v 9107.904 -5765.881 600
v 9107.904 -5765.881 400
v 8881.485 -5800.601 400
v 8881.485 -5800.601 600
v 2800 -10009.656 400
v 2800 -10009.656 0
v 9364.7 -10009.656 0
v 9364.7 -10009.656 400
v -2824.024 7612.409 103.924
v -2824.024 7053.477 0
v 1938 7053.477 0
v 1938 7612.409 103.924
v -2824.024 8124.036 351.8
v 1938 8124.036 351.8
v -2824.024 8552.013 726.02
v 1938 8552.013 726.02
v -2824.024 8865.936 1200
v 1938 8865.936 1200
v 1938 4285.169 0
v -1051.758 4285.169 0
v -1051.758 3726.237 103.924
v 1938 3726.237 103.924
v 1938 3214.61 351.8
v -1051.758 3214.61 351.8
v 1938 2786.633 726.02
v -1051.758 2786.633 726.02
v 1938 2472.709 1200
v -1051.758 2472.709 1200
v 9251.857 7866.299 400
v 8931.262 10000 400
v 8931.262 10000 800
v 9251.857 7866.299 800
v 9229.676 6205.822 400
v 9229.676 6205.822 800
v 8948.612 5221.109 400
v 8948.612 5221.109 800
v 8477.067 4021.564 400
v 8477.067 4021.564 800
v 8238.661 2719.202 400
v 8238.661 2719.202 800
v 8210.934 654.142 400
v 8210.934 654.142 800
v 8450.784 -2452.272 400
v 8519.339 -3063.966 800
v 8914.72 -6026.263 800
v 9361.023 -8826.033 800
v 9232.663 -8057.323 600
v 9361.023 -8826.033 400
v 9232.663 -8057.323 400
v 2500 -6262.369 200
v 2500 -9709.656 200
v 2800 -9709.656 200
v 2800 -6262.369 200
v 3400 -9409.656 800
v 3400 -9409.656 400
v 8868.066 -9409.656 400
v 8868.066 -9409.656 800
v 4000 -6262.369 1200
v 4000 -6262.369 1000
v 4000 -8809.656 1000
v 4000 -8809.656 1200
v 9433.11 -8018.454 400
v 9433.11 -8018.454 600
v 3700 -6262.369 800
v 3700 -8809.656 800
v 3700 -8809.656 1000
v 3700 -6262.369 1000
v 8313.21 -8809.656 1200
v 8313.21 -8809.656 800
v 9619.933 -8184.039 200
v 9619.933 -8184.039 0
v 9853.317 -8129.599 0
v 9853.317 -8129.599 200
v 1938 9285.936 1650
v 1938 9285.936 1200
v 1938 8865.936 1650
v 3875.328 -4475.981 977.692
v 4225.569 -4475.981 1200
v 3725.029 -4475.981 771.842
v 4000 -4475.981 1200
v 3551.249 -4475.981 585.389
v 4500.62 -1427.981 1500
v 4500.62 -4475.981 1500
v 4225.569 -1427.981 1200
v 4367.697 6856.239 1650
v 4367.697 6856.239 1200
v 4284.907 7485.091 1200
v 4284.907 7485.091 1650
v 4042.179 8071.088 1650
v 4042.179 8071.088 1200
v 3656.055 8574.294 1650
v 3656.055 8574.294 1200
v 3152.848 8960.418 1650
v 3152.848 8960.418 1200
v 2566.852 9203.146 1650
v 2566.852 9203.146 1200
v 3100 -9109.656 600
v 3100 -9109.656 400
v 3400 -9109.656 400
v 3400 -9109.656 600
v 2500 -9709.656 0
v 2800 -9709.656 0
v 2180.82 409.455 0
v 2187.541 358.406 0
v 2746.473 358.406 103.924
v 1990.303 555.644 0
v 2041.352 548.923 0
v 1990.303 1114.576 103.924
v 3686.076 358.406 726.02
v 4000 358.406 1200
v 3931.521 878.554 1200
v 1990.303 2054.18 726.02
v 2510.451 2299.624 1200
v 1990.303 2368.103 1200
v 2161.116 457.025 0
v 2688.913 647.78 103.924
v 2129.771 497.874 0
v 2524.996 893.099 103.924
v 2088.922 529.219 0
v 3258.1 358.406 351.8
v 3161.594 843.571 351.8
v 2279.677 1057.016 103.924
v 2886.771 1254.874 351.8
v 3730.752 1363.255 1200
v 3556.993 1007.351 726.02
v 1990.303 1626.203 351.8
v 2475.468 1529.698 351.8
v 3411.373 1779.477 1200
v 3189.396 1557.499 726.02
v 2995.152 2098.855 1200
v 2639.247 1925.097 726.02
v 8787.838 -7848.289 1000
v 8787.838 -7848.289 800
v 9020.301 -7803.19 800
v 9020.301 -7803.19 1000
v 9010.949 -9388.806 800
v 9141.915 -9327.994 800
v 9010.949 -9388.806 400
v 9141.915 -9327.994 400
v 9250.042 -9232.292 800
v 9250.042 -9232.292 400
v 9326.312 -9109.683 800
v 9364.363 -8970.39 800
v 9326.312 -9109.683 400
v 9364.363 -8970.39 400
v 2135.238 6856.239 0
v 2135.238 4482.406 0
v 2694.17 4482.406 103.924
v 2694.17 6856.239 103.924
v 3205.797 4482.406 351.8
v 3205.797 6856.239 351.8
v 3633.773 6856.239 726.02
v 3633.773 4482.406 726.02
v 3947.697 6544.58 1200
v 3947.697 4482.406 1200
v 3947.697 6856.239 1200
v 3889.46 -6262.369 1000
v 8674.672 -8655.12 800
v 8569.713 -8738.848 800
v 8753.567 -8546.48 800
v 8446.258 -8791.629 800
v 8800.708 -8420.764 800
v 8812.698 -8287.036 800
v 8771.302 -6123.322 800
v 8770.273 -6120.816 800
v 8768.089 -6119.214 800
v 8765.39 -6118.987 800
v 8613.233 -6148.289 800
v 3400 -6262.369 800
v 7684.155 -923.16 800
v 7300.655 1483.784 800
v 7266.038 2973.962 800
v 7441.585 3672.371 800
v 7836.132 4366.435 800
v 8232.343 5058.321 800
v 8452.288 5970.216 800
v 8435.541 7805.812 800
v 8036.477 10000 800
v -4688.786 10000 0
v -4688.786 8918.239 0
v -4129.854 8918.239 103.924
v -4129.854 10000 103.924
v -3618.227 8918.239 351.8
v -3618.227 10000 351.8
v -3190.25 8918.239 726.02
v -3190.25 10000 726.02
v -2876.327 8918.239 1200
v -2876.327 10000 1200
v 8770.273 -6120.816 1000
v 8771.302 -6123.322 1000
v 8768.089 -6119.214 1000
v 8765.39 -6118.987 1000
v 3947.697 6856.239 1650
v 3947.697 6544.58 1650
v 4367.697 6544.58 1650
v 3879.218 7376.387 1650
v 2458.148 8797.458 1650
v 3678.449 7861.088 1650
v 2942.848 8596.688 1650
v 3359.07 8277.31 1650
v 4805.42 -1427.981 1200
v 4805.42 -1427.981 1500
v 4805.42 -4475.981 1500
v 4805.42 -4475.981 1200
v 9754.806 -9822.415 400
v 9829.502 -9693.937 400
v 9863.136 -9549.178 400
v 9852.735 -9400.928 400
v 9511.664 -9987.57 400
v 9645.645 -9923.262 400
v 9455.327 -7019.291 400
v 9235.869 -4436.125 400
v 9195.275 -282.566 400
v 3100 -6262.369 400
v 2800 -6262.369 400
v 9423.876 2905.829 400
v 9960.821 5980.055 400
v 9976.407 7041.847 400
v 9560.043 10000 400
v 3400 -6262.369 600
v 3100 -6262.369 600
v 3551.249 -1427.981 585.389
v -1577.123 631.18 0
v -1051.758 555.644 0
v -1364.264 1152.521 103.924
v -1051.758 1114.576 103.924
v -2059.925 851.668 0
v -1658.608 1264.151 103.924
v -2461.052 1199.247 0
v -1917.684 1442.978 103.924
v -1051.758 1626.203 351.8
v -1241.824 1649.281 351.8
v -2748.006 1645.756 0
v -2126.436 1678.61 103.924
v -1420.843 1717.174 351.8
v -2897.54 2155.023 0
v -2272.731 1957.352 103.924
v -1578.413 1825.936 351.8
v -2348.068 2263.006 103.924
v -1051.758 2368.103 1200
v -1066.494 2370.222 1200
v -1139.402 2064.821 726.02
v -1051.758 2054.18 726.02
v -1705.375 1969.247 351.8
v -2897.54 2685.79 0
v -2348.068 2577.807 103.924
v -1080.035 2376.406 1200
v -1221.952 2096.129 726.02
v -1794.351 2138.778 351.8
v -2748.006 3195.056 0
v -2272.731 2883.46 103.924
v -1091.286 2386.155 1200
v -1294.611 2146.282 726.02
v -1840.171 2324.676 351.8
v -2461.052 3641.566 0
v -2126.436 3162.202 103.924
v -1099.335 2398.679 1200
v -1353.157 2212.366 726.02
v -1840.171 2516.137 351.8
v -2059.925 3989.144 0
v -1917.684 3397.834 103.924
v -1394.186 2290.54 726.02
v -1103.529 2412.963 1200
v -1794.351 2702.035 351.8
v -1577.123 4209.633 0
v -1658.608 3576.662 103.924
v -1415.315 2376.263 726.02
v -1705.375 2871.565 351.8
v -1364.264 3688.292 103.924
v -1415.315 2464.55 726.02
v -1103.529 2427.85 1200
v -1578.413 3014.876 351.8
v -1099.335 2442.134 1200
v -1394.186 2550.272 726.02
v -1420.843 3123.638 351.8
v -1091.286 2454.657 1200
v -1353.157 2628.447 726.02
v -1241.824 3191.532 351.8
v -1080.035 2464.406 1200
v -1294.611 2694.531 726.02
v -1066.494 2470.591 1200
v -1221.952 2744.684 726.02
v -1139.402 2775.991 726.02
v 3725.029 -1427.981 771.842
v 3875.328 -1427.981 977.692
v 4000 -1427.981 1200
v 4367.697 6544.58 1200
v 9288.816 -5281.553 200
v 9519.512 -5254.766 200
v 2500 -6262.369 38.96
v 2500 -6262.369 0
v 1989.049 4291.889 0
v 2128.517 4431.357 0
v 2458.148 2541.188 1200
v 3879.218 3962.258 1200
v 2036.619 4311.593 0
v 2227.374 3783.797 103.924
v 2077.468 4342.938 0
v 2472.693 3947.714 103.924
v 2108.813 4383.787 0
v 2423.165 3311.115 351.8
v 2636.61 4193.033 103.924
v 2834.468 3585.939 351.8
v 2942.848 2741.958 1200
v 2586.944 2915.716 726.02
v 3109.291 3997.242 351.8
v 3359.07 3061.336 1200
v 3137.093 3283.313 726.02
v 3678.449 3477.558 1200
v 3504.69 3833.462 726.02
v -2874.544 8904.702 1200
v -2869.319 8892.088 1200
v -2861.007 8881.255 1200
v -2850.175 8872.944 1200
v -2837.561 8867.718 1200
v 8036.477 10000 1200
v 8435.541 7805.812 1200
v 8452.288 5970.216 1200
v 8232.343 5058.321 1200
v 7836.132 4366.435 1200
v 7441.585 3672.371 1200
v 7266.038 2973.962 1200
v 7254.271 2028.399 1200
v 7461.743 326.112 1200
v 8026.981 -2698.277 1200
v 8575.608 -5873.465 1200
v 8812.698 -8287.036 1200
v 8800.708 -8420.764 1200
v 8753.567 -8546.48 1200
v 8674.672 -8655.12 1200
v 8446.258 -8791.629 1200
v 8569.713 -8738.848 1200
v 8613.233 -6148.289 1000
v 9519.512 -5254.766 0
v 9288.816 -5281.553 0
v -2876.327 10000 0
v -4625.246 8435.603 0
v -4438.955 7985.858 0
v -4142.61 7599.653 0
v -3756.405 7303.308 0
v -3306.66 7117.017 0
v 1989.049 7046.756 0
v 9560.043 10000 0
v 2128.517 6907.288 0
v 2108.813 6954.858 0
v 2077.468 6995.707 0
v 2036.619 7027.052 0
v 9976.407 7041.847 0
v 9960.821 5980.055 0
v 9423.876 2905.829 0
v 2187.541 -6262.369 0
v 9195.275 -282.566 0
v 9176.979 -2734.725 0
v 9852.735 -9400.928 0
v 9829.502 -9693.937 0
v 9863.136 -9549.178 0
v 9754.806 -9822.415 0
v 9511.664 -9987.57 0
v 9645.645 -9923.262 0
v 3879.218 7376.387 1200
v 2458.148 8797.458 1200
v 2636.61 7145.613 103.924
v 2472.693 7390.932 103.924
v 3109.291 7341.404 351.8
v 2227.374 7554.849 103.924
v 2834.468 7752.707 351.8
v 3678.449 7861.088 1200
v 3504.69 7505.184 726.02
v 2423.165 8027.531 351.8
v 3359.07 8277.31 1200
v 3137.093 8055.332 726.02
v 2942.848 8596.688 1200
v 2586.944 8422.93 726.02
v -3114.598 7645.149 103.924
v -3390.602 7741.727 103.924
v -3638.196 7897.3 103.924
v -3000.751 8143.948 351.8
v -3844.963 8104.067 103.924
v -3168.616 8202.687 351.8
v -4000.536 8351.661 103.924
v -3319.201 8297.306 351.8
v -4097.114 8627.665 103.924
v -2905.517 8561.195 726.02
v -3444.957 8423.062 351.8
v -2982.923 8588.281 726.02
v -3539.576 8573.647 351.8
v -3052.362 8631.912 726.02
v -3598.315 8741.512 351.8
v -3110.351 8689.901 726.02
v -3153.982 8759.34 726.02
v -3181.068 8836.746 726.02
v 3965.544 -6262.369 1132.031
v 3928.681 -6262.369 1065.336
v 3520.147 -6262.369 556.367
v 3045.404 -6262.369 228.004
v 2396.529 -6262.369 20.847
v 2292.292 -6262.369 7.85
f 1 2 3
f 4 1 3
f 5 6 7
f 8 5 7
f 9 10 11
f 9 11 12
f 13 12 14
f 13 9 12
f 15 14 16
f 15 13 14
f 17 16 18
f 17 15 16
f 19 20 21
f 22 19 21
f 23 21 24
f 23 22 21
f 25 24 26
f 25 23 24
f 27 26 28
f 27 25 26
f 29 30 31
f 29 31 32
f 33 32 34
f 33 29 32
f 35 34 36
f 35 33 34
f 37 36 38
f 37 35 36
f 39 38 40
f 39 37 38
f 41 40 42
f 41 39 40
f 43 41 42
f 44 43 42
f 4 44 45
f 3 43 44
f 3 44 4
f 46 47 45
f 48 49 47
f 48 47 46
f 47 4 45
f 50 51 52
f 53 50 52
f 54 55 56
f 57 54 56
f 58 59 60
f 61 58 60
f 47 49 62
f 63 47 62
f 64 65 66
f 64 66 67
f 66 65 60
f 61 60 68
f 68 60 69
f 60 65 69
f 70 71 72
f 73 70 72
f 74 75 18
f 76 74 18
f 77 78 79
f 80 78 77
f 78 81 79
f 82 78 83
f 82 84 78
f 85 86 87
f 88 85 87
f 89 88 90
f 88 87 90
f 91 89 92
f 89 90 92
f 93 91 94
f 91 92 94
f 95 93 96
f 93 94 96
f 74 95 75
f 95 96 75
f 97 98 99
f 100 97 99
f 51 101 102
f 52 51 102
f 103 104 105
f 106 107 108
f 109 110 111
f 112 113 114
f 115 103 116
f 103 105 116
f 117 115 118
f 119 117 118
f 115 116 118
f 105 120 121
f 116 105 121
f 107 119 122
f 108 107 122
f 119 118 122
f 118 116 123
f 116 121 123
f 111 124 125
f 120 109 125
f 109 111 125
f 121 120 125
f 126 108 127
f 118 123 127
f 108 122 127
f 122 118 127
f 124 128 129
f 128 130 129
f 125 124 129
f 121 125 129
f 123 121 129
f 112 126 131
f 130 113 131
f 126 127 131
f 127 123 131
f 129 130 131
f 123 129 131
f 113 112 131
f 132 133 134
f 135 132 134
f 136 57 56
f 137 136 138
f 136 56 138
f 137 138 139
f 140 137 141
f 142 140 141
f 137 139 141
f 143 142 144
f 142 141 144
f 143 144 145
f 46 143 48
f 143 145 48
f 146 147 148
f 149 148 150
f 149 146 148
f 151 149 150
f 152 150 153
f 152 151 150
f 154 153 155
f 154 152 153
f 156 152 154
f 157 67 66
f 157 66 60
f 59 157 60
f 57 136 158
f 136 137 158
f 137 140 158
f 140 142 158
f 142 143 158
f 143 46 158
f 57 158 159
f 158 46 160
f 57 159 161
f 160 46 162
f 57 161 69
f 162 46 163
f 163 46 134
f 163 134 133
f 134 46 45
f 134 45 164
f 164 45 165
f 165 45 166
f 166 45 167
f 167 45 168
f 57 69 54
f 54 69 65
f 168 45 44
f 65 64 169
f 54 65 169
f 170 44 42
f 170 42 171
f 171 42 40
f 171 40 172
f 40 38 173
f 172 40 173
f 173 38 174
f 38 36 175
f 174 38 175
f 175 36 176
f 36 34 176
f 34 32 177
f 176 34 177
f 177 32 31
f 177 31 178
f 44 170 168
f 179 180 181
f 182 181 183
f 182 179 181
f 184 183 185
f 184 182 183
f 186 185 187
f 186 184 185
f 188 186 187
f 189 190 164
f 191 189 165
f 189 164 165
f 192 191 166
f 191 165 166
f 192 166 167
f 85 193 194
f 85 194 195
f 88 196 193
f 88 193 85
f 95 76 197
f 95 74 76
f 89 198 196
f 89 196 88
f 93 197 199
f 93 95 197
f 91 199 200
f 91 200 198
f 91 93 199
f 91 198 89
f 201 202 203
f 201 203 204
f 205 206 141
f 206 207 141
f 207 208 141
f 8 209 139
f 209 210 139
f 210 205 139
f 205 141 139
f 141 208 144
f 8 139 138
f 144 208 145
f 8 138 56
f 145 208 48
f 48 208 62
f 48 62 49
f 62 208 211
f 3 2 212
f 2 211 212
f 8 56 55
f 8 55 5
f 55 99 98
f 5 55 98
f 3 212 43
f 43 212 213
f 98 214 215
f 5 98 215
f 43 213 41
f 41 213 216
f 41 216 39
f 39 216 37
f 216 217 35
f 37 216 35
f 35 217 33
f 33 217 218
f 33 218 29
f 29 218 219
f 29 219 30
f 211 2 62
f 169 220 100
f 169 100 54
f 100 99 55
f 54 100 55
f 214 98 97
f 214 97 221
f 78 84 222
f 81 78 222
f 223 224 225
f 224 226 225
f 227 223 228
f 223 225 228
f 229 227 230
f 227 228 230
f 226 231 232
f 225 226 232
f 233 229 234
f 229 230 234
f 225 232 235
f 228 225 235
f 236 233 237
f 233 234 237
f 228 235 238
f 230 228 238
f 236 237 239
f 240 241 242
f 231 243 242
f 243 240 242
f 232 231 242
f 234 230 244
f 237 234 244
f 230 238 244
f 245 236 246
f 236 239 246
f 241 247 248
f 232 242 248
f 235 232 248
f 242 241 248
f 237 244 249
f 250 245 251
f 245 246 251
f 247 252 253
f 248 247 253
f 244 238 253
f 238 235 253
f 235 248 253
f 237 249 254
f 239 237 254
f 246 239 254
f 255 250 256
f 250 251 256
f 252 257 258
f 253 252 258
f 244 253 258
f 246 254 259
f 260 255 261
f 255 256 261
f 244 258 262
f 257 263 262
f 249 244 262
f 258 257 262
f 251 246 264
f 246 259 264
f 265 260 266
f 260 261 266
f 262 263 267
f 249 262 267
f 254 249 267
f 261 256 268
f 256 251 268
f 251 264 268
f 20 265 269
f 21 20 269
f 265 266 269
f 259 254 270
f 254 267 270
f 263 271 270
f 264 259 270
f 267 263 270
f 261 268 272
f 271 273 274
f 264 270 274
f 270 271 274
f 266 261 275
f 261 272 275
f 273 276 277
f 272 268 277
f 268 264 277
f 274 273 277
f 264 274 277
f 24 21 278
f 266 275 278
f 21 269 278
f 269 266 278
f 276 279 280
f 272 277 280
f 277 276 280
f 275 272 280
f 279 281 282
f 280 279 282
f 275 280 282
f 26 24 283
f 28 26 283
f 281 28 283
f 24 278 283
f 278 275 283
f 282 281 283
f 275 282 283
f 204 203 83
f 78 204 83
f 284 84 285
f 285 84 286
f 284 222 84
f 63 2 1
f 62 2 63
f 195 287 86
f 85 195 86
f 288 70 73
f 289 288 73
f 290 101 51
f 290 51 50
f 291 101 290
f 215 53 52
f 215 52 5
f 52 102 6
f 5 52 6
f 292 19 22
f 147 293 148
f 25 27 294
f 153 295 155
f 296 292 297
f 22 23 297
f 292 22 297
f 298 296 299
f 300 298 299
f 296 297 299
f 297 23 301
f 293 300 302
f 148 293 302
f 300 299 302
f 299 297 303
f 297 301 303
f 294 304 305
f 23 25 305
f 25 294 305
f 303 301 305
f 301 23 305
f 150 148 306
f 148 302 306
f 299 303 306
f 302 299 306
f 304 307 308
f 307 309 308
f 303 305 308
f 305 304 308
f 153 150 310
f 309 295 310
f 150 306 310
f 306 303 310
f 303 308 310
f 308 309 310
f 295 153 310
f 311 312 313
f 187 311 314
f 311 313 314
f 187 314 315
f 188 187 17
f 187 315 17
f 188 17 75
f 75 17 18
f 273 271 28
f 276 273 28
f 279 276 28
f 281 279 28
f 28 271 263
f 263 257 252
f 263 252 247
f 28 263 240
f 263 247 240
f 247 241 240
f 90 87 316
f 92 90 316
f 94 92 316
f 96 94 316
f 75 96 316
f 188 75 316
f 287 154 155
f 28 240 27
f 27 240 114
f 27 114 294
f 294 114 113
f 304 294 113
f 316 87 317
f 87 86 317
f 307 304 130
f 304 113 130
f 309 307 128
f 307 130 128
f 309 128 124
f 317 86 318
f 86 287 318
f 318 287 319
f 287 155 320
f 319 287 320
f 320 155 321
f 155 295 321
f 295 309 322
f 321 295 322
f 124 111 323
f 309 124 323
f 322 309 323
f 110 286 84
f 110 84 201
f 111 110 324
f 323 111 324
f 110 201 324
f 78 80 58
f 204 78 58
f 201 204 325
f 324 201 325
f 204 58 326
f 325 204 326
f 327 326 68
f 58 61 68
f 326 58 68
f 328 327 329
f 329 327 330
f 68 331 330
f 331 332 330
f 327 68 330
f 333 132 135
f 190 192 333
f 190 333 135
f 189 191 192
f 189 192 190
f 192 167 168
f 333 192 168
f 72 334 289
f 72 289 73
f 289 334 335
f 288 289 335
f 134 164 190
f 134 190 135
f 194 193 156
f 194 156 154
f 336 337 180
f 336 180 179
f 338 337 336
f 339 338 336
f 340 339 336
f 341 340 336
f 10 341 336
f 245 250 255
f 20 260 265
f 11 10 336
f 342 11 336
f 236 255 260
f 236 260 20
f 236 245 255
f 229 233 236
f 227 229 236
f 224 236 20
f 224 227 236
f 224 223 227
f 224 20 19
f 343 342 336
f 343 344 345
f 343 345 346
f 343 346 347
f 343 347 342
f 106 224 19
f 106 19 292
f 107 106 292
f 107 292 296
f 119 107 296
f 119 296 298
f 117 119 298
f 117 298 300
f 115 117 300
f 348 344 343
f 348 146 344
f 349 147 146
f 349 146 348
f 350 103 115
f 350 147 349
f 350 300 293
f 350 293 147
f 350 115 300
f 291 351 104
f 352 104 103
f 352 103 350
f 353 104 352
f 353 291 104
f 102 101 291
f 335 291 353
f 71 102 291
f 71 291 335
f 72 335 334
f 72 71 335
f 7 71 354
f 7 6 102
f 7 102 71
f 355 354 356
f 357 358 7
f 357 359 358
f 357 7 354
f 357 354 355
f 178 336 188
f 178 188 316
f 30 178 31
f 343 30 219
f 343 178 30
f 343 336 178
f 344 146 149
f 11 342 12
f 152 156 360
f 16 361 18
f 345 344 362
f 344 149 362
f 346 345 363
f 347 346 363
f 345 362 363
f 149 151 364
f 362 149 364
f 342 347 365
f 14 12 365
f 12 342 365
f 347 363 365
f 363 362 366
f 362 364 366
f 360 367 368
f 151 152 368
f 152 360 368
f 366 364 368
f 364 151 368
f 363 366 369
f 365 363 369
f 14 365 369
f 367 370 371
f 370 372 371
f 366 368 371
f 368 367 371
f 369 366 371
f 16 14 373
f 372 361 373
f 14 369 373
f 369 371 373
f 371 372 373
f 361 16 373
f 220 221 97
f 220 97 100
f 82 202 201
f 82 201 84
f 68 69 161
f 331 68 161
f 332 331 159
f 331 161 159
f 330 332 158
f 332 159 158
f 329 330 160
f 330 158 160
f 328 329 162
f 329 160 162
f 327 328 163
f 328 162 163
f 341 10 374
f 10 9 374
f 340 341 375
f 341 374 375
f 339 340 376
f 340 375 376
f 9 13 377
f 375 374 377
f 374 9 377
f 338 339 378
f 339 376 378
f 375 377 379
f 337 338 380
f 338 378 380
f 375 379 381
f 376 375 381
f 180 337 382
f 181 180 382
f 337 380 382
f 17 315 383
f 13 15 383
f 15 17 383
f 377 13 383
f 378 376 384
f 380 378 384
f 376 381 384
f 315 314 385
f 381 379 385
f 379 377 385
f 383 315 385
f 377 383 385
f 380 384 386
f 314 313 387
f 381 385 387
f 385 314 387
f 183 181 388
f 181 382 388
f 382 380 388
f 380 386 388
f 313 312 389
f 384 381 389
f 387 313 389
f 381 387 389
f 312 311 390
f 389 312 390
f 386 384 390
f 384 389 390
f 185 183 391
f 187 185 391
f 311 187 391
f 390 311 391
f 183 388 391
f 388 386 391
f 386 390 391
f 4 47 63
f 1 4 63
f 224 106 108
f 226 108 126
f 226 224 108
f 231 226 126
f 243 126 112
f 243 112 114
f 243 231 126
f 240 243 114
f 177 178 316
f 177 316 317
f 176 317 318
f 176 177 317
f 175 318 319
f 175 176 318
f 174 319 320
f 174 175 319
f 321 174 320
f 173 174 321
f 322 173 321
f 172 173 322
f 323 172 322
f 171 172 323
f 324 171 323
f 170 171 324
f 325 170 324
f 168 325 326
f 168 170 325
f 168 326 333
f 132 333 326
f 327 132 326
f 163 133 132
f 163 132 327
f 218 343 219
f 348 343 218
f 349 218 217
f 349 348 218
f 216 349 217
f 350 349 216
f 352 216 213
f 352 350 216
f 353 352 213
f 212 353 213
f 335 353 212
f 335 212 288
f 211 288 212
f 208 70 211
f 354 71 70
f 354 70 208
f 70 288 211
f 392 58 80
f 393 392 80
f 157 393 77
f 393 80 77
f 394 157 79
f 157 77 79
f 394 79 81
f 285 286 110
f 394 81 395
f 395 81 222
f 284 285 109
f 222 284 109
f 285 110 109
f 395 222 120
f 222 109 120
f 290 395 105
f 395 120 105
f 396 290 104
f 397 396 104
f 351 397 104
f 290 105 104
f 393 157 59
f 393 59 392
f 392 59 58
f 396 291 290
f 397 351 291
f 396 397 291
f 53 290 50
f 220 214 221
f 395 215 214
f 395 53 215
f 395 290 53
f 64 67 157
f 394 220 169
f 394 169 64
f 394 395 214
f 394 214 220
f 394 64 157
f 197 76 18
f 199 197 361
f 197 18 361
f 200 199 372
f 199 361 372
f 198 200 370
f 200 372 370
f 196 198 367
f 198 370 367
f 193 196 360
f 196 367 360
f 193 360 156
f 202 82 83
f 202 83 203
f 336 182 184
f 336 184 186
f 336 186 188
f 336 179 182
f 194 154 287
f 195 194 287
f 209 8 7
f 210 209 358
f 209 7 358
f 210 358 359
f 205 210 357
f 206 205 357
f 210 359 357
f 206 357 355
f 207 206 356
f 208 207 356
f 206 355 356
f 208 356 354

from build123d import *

# Parameters (mm, degrees)
F1_DEPTH  = 1200
F0_W      = 300
F0_H      = 2547.2870769622
F2_DEPTH  = 1000
F3_DEPTH  = 800
F4_DEPTH  = 400
F0_H_2    = 3447.2870769622
F5_DEPTH  = 200
F0_H_3    = 2847.2870769622
F6_DEPTH  = 600
F7_DEPTH  = 200
F8_DEPTH  = 600
F9_DEPTH  = 1000
F16_DEPTH = 1524
F17_DEPTH = 1524
F19_DEPTH = 1200
F21_DEPTH = 450


# Not quite as in the source:
# - a feature names something its author has since deleted; it is built from what else it names


with BuildPart() as f1:
    # F0 (on Top) → F1 (new body)
    with BuildSketch(Plane.XY):
        with BuildLine():
            add(Edge.make_bspline(
                [(8036.4767474961, 10000), (8470.360187732, 8329.6323969196), (8825.7729510838, 4902.0254055318), (6395.2285988216, 3439.3794917817), (8125.3995442021, -2476.6123096312), (8613.2334310908, -6148.2885131691)],
                knots=[0, 0, 0, 0, 0.3059270672, 0.5172086345, 0.9042918919, 0.9042918919, 0.9042918919, 0.9042918919], degree=3))
            Line((8036.4767474961, 10000), (4000, 10000))
            Line((4000, 10000), (4000, -6262.3690662263))
            Line((4000, -6262.3690662263), (4000, -8809.6561431885))
            Line((4000, -8809.6561431885), (8313.2095440952, -8809.6561431885))
            ThreePointArc((8313.2095440952, -8809.6561431885), (8674.6718087547, -8655.1196452075), (8812.6976232832, -8287.0362680974))
            add(Edge.make_bspline(
                [(8787.8384059317, -7848.2893931684), (8797.784205551, -7995.4454937091), (8806.1180126829, -8141.7464710797), (8812.6976232832, -8287.0362680974)],
                knots=[0.9647293852, 0.9647293852, 0.9647293852, 0.9647293852, 0.9806900234, 0.9806900234, 0.9806900234, 0.9806900234], degree=3))
            add(Edge.make_bspline(
                [(8613.2334310908, -6148.2885131691), (8689.4016886612, -6721.5680378242), (8750.1770548915, -7291.0594295347), (8787.8384059317, -7848.2893931684)],
                knots=[0.9042918919, 0.9042918919, 0.9042918919, 0.9042918919, 0.9647293852, 0.9647293852, 0.9647293852, 0.9647293852], degree=3))
        make_face()
    extrude(amount=F1_DEPTH)

    # F0 (on Top) → F2 (join)
    with BuildSketch(Plane.XY):
        with Locations((3850, -7536.0126047074)):
            Rectangle(F0_W, F0_H)
    extrude(amount=F2_DEPTH)

    # F0 (on Top) → F3 (join)
    with BuildSketch(Plane.XY):
        with BuildLine():
            add(Edge.make_bspline(
                [(8931.2620162964, 10000), (9293.0913160754, 8171.5294795271), (9500.0632293716, 5666.7426139981), (7761.7678229589, 3579.4250276228), (8387.3000385547, -2422.1204070051), (8881.4852022515, -5800.6006208613)],
                knots=[0, 0, 0, 0, 0.2826529688, 0.5104916215, 0.8656069765, 0.8656069765, 0.8656069765, 0.8656069765], degree=3))
            Line((8931.2620162964, 10000), (8036.4767474961, 10000))
            add(Edge.make_bspline(
                [(8036.4767474961, 10000), (8470.360187732, 8329.6323969196), (8825.7729510838, 4902.0254055318), (6395.2285988216, 3439.3794917817), (8125.3995442021, -2476.6123096312), (8613.2334310908, -6148.2885131691)],
                knots=[0, 0, 0, 0, 0.3059270672, 0.5172086345, 0.9042918919, 0.9042918919, 0.9042918919, 0.9042918919], degree=3))
            Line((8613.2334310908, -6148.2885131691), (8765.3897849551, -6118.9868246126))
            ThreePointArc((8765.3897849551, -6118.9868246126), (8769.2917139348, -6119.8642958095), (8771.3021241999, -6123.3216439306))
            add(Edge.make_bspline(
                [(8771.3021241999, -6123.3216439306), (8813.4933748329, -6487.7883786699), (8889.3749215397, -7142.4063040065), (8980.0635134111, -7600.1104032829), (9020.3012339996, -7803.1896360599)],
                knots=[0.0027166629, 0.0027166629, 0.0027166629, 0.0027166629, 0.5575142646, 1, 1, 1, 1], degree=3))
            Line((9020.3012339996, -7803.1896360599), (8787.8384059317, -7848.2893931684))
            add(Edge.make_bspline(
                [(8787.8384059317, -7848.2893931684), (8797.784205551, -7995.4454937091), (8806.1180126829, -8141.7464710797), (8812.6976232832, -8287.0362680974)],
                knots=[0.9647293852, 0.9647293852, 0.9647293852, 0.9647293852, 0.9806900234, 0.9806900234, 0.9806900234, 0.9806900234], degree=3))
            ThreePointArc((8812.6976232832, -8287.0362680974), (8674.6718087547, -8655.1196452075), (8313.2095440952, -8809.6561431885))
            Line((8313.2095440952, -8809.6561431885), (4000, -8809.6561431885))
            Line((4000, -8809.6561431885), (3700, -8809.6561431885))
            Line((3700, -8809.6561431885), (3700, -6262.3690662263))
            Line((3700, -6262.3690662263), (3400, -6262.3690662263))
            Line((3400, -6262.3690662263), (3400, -9109.6561431885))
            Line((3400, -9109.6561431885), (3400, -9409.6561431885))
            Line((3400, -9409.6561431885), (8868.0657153652, -9409.6561431885))
            ThreePointArc((8868.0657153652, -9409.6561431885), (9250.0419437511, -9232.2924104432), (9361.0232533911, -8826.0327869808))
            add(Edge.make_bspline(
                [(9232.6634049447, -8057.3231214569), (9275.6513945538, -8319.0025360325), (9318.5440756349, -8575.6191246537), (9361.0232533911, -8826.0327869808)],
                knots=[0.9470475744, 0.9470475744, 0.9470475744, 0.9470475744, 0.9765767788, 0.9765767788, 0.9765767788, 0.9765767788], degree=3))
            add(Edge.make_bspline(
                [(8881.4852022515, -5800.6006208613), (8994.8194600953, -6575.4064543937), (9114.1039092929, -7335.6196946013), (9232.6634049447, -8057.3231214569)],
                knots=[0.8656069765, 0.8656069765, 0.8656069765, 0.8656069765, 0.9470475744, 0.9470475744, 0.9470475744, 0.9470475744], degree=3))
        make_face()
        with Locations((3850, -7536.0126047074)):
            Rectangle(F0_W, F0_H)
    extrude(amount=F3_DEPTH)

    # F0 (on Top) → F4 (join)
    with BuildSketch(Plane.XY):
        with BuildLine():
            add(Edge.make_bspline(
                [(9560.0433349609, 10000), (9738.6629226993, 8251.3060611052), (10297.4382102532, 6478.450699769), (9272.7191558649, 3657.2770747912), (9063.0227701453, -2174.939075243), (9288.8157490666, -5281.5532921831)],
                knots=[0, 0, 0, 0, 0.2568406889, 0.506321619, 0.8252622074, 0.8252622074, 0.8252622074, 0.8252622074], degree=3))
            Line((9560.0433349609, 10000), (8931.2620162964, 10000))
            add(Edge.make_bspline(
                [(8931.2620162964, 10000), (9293.0913160754, 8171.5294795271), (9500.0632293716, 5666.7426139981), (7761.7678229589, 3579.4250276228), (8387.3000385547, -2422.1204070051), (8881.4852022515, -5800.6006208613)],
                knots=[0, 0, 0, 0, 0.2826529688, 0.5104916215, 0.8656069765, 0.8656069765, 0.8656069765, 0.8656069765], degree=3))
            Line((8881.4852022515, -5800.6006208613), (9107.9036665642, -5765.8809567214))
            add(Edge.make_bspline(
                [(9107.9036665642, -5765.8809567214), (9143.5522743599, -6143.655941097), (9214.8742017644, -6899.4677855656), (9360.3479276578, -7645.3727259321), (9433.1099926681, -8018.4544176886)],
                knots=[0, 0, 0, 0, 0.4998267587, 1, 1, 1, 1], degree=3))
            Line((9433.1099926681, -8018.4544176886), (9232.6634049447, -8057.3231214569))
            add(Edge.make_bspline(
                [(9232.6634049447, -8057.3231214569), (9275.6513945538, -8319.0025360325), (9318.5440756349, -8575.6191246537), (9361.0232533911, -8826.0327869808)],
                knots=[0.9470475744, 0.9470475744, 0.9470475744, 0.9470475744, 0.9765767788, 0.9765767788, 0.9765767788, 0.9765767788], degree=3))
            ThreePointArc((9361.0232533911, -8826.0327869808), (9250.0419437511, -9232.2924104432), (8868.0657153652, -9409.6561431885))
            Line((8868.0657153652, -9409.6561431885), (3400, -9409.6561431885))
            Line((3400, -9409.6561431885), (3400, -9109.6561431885))
            Line((3400, -9109.6561431885), (3100, -9109.6561431885))
            Line((3100, -9109.6561431885), (3100, -6262.3690662263))
            Line((3100, -6262.3690662263), (2800, -6262.3690662263))
            Line((2800, -6262.3690662263), (2800, -9709.6561431885))
            Line((2800, -9709.6561431885), (2800, -10009.6561431885))
            Line((2800, -10009.6561431885), (9364.7003943114, -10009.6561431885))
            ThreePointArc((9364.7003943114, -10009.6561431885), (9754.8055196615, -9822.4148220059), (9852.735448729, -9400.928107891))
            add(Edge.make_bspline(
                [(9619.9330184672, -8184.0387894501), (9688.5849810725, -8604.4405106021), (9765.9866472577, -9011.5487180137), (9852.735448729, -9400.928107891)],
                knots=[0.927942243, 0.927942243, 0.927942243, 0.927942243, 0.9748943399, 0.9748943399, 0.9748943399, 0.9748943399], degree=3))
            add(Edge.make_bspline(
                [(9288.8157490666, -5281.5532921831), (9361.507754855, -6281.6996196687), (9469.7973180649, -7264.6578357211), (9619.9330184672, -8184.0387894501)],
                knots=[0.8252622074, 0.8252622074, 0.8252622074, 0.8252622074, 0.927942243, 0.927942243, 0.927942243, 0.927942243], degree=3))
        make_face()
    extrude(amount=F4_DEPTH)

    # F0 (on Top) → F5 (join)
    with BuildSketch(Plane.XY):
        with Locations((2650, -7986.0126047074)):
            Rectangle(F0_W, F0_H_2)
    extrude(amount=F5_DEPTH)

    # F0 (on Top) → F6 (join)
    with BuildSketch(Plane.XY):
        with Locations((3250, -7686.0126047074)):
            Rectangle(F0_W, F0_H_3)
    extrude(amount=F6_DEPTH)

    # F0 (on Top) → F7 (join)
    with BuildSketch(Plane.XY):
        with BuildLine():
            Line((9519.5121765137, -5254.7664642334), (9288.8157490666, -5281.5532921831))
            add(Edge.make_bspline(
                [(9288.8157490666, -5281.5532921831), (9361.507754855, -6281.6996196687), (9469.7973180649, -7264.6578357211), (9619.9330184672, -8184.0387894501)],
                knots=[0.8252622074, 0.8252622074, 0.8252622074, 0.8252622074, 0.927942243, 0.927942243, 0.927942243, 0.927942243], degree=3))
            Line((9619.9330184672, -8184.0387894501), (9853.3172420489, -8129.59868503))
            add(Edge.make_bspline(
                [(9519.5121765137, -5254.7664642334), (9556.921579776, -5743.8481856875), (9631.2627095363, -6715.7665951577), (9779.6168128683, -7660.3444408865), (9853.3172420489, -8129.59868503)],
                knots=[0, 0, 0, 0, 0.5032127354, 1, 1, 1, 1], degree=3))
        make_face()
    extrude(amount=F7_DEPTH)

    # F0 (on Top) → F8 (join)
    with BuildSketch(Plane.XY):
        with BuildLine():
            Line((9107.9036665642, -5765.8809567214), (8881.4852022515, -5800.6006208613))
            add(Edge.make_bspline(
                [(8881.4852022515, -5800.6006208613), (8994.8194600953, -6575.4064543937), (9114.1039092929, -7335.6196946013), (9232.6634049447, -8057.3231214569)],
                knots=[0.8656069765, 0.8656069765, 0.8656069765, 0.8656069765, 0.9470475744, 0.9470475744, 0.9470475744, 0.9470475744], degree=3))
            Line((9232.6634049447, -8057.3231214569), (9433.1099926681, -8018.4544176886))
            add(Edge.make_bspline(
                [(9107.9036665642, -5765.8809567214), (9143.5522743599, -6143.655941097), (9214.8742017644, -6899.4677855656), (9360.3479276578, -7645.3727259321), (9433.1099926681, -8018.4544176886)],
                knots=[0, 0, 0, 0, 0.4998267587, 1, 1, 1, 1], degree=3))
        make_face()
    extrude(amount=F8_DEPTH)

    # F0 (on Top) → F9 (join)
    with BuildSketch(Plane.XY):
        with BuildLine():
            Line((8765.3897849551, -6118.9868246126), (8613.2334310908, -6148.2885131691))
            add(Edge.make_bspline(
                [(8613.2334310908, -6148.2885131691), (8689.4016886612, -6721.5680378242), (8750.1770548915, -7291.0594295347), (8787.8384059317, -7848.2893931684)],
                knots=[0.9042918919, 0.9042918919, 0.9042918919, 0.9042918919, 0.9647293852, 0.9647293852, 0.9647293852, 0.9647293852], degree=3))
            Line((8787.8384059317, -7848.2893931684), (9020.3012339996, -7803.1896360599))
            add(Edge.make_bspline(
                [(8771.3021241999, -6123.3216439306), (8813.4933748329, -6487.7883786699), (8889.3749215397, -7142.4063040065), (8980.0635134111, -7600.1104032829), (9020.3012339996, -7803.1896360599)],
                knots=[0.0027166629, 0.0027166629, 0.0027166629, 0.0027166629, 0.5575142646, 1, 1, 1, 1], degree=3))
            ThreePointArc((8771.3021241999, -6123.3216439306), (8769.2917139348, -6119.8642958095), (8765.3897849551, -6118.9868246126))
        make_face()
    extrude(amount=F9_DEPTH)

    # F12: sweep along a path in F0
    with BuildLine(Plane.XY) as f12_path:
        Line((2240.3030395508, -6262.3690662263), (2240.3030395508, 358.4062457085))
        ThreePointArc((2240.3030395508, 358.4062457085), (2167.0797348474, 535.1829410051), (1990.3030395508, 608.4062457085))
        Line((1990.3030395508, 608.4062457085), (-1051.7582893372, 608.4062457085))
        ThreePointArc((-1051.7582893372, 608.4062457085), (-2863.7582893372, 2420.4062457085), (-1051.7582893372, 4232.4062457085))
        Line((-1051.7582893372, 4232.4062457085), (1938, 4232.4062457085))
        ThreePointArc((1938, 4232.4062457085), (2114.7766952966, 4305.6295504118), (2188, 4482.4062457085))
        Line((2188, 4482.4062457085), (2188, 6856.2393188477))
        ThreePointArc((2188, 6856.2393188477), (2114.7766952966, 7033.0160141443), (1938, 7106.2393188477))
        Line((1938, 7106.2393188477), (-2824.0236428859, 7106.2393188477))
        ThreePointArc((-2824.0236428859, 7106.2393188477), (-4105.3011303959, 7636.9618313376), (-4636.0236428859, 8918.2393188477))
        Line((-4636.0236428859, 8918.2393188477), (-4636.0236428859, 10000))
    # F11 (on line) → F12 (sweep)
    with BuildSketch(Plane(origin=(0, -6262.3690662263, 0), x_dir=(-1, 0, 0), z_dir=(0, 1, 0))):
        with BuildLine():
            ThreePointArc((-2187.540769577, 0), (-3258.099588071, 351.8000155689), (-4000, 1200))
            Line((-4000, 1200), (-4000, 1000))
            Line((-4000, 1000), (-4000, 0))
            Line((-4000, 0), (-2187.540769577, 0))
        make_face()
    sweep(path=f12_path.line)

    # F15 (on face) → F16 (join, symmetric)
    with BuildSketch(Plane(origin=(0, -2951.9814102589, 0), x_dir=(-1, 0, 0), z_dir=(0, 1, 0))):
        Polygon((-4225.5687713623, 1200), (-4500.6198883057, 1500), (-4805.4198883057, 1500), (-4805.4198883057, 1200), align=None)
    extrude(amount=F16_DEPTH, both=True)

    # F15 (on face) → F17 (cut, symmetric)
    with BuildSketch(Plane(origin=(0, -2951.9814102589, 0), x_dir=(-1, 0, 0), z_dir=(0, 1, 0))):
        Polygon((-3236.7072105408, 1854.6521663666), (-4225.5687713623, 1200), (-3485.6019020081, 525.5545377731), (-1603.2665967941, 735.3942990303), align=None)
    extrude(amount=F17_DEPTH, both=True, mode=Mode.SUBTRACT)

    # F18 (on face) → F19 (join)
    with BuildSketch(Plane(origin=(0, 0, 0), x_dir=(1, 0, 0), z_dir=(0, 0, -1))):
        with BuildLine():
            Line((-2876.3266824367, -10000), (4000, -10000))
            Line((4000, -10000), (4000, -358.4062457085))
            ThreePointArc((4000, -358.4062457085), (3411.3733884144, -1779.4765945721), (1990.3030395508, -2368.1032061577))
            Line((1990.3030395508, -2368.1032061577), (-1051.7582893372, -2368.1032061577))
            ThreePointArc((-1051.7582893372, -2368.1032061577), (-1104.0613288879, -2420.4062457085), (-1051.7582893372, -2472.7092852592))
            Line((-1051.7582893372, -2472.7092852592), (1938, -2472.7092852592))
            ThreePointArc((1938, -2472.7092852592), (3359.0703488636, -3061.3358968448), (3947.6969604492, -4482.4062457084))
            Line((3947.6969604492, -4482.4062457084), (3947.6969604492, -6856.2393188476))
            ThreePointArc((3947.6969604492, -6856.2393188476), (3359.0703488637, -8277.3096677112), (1938.0000000002, -8865.9362792969))
            Line((1938.0000000002, -8865.9362792969), (-2824.0236428857, -8865.9362792969))
            ThreePointArc((-2824.0236428857, -8865.9362792969), (-2861.0074768288, -8881.2554849045), (-2876.3266824367, -8918.2393188475))
            Line((-2876.3266824367, -8918.2393188475), (-2876.3266824367, -9999.9999999998))
        make_face()
    extrude(amount=-F19_DEPTH)

    # F20 (on face) → F21 (join)
    with BuildSketch(Plane.XY.offset(1200)):
        with BuildLine():
            ThreePointArc((1938, 8865.9362792969), (3359.0703488636, 8277.3096677113), (3947.6969604492, 6856.2393188477))
            Line((3947.6969604492, 6856.2393188477), (3947.6969604492, 6544.5799827576))
            Line((3947.6969604492, 6544.5799827576), (4367.6966701962, 6544.5799827576))
            Line((4367.6966701962, 6544.5799827576), (4367.6966701962, 6856.2393188477))
            ThreePointArc((4367.6966701962, 6856.2393188477), (3656.0549917221, 8574.2943105698), (1938, 9285.9359890439))
            Line((1938, 9285.9359890439), (1938, 8865.9362792969))
        make_face()
    extrude(amount=F21_DEPTH)


solid = f1.part
